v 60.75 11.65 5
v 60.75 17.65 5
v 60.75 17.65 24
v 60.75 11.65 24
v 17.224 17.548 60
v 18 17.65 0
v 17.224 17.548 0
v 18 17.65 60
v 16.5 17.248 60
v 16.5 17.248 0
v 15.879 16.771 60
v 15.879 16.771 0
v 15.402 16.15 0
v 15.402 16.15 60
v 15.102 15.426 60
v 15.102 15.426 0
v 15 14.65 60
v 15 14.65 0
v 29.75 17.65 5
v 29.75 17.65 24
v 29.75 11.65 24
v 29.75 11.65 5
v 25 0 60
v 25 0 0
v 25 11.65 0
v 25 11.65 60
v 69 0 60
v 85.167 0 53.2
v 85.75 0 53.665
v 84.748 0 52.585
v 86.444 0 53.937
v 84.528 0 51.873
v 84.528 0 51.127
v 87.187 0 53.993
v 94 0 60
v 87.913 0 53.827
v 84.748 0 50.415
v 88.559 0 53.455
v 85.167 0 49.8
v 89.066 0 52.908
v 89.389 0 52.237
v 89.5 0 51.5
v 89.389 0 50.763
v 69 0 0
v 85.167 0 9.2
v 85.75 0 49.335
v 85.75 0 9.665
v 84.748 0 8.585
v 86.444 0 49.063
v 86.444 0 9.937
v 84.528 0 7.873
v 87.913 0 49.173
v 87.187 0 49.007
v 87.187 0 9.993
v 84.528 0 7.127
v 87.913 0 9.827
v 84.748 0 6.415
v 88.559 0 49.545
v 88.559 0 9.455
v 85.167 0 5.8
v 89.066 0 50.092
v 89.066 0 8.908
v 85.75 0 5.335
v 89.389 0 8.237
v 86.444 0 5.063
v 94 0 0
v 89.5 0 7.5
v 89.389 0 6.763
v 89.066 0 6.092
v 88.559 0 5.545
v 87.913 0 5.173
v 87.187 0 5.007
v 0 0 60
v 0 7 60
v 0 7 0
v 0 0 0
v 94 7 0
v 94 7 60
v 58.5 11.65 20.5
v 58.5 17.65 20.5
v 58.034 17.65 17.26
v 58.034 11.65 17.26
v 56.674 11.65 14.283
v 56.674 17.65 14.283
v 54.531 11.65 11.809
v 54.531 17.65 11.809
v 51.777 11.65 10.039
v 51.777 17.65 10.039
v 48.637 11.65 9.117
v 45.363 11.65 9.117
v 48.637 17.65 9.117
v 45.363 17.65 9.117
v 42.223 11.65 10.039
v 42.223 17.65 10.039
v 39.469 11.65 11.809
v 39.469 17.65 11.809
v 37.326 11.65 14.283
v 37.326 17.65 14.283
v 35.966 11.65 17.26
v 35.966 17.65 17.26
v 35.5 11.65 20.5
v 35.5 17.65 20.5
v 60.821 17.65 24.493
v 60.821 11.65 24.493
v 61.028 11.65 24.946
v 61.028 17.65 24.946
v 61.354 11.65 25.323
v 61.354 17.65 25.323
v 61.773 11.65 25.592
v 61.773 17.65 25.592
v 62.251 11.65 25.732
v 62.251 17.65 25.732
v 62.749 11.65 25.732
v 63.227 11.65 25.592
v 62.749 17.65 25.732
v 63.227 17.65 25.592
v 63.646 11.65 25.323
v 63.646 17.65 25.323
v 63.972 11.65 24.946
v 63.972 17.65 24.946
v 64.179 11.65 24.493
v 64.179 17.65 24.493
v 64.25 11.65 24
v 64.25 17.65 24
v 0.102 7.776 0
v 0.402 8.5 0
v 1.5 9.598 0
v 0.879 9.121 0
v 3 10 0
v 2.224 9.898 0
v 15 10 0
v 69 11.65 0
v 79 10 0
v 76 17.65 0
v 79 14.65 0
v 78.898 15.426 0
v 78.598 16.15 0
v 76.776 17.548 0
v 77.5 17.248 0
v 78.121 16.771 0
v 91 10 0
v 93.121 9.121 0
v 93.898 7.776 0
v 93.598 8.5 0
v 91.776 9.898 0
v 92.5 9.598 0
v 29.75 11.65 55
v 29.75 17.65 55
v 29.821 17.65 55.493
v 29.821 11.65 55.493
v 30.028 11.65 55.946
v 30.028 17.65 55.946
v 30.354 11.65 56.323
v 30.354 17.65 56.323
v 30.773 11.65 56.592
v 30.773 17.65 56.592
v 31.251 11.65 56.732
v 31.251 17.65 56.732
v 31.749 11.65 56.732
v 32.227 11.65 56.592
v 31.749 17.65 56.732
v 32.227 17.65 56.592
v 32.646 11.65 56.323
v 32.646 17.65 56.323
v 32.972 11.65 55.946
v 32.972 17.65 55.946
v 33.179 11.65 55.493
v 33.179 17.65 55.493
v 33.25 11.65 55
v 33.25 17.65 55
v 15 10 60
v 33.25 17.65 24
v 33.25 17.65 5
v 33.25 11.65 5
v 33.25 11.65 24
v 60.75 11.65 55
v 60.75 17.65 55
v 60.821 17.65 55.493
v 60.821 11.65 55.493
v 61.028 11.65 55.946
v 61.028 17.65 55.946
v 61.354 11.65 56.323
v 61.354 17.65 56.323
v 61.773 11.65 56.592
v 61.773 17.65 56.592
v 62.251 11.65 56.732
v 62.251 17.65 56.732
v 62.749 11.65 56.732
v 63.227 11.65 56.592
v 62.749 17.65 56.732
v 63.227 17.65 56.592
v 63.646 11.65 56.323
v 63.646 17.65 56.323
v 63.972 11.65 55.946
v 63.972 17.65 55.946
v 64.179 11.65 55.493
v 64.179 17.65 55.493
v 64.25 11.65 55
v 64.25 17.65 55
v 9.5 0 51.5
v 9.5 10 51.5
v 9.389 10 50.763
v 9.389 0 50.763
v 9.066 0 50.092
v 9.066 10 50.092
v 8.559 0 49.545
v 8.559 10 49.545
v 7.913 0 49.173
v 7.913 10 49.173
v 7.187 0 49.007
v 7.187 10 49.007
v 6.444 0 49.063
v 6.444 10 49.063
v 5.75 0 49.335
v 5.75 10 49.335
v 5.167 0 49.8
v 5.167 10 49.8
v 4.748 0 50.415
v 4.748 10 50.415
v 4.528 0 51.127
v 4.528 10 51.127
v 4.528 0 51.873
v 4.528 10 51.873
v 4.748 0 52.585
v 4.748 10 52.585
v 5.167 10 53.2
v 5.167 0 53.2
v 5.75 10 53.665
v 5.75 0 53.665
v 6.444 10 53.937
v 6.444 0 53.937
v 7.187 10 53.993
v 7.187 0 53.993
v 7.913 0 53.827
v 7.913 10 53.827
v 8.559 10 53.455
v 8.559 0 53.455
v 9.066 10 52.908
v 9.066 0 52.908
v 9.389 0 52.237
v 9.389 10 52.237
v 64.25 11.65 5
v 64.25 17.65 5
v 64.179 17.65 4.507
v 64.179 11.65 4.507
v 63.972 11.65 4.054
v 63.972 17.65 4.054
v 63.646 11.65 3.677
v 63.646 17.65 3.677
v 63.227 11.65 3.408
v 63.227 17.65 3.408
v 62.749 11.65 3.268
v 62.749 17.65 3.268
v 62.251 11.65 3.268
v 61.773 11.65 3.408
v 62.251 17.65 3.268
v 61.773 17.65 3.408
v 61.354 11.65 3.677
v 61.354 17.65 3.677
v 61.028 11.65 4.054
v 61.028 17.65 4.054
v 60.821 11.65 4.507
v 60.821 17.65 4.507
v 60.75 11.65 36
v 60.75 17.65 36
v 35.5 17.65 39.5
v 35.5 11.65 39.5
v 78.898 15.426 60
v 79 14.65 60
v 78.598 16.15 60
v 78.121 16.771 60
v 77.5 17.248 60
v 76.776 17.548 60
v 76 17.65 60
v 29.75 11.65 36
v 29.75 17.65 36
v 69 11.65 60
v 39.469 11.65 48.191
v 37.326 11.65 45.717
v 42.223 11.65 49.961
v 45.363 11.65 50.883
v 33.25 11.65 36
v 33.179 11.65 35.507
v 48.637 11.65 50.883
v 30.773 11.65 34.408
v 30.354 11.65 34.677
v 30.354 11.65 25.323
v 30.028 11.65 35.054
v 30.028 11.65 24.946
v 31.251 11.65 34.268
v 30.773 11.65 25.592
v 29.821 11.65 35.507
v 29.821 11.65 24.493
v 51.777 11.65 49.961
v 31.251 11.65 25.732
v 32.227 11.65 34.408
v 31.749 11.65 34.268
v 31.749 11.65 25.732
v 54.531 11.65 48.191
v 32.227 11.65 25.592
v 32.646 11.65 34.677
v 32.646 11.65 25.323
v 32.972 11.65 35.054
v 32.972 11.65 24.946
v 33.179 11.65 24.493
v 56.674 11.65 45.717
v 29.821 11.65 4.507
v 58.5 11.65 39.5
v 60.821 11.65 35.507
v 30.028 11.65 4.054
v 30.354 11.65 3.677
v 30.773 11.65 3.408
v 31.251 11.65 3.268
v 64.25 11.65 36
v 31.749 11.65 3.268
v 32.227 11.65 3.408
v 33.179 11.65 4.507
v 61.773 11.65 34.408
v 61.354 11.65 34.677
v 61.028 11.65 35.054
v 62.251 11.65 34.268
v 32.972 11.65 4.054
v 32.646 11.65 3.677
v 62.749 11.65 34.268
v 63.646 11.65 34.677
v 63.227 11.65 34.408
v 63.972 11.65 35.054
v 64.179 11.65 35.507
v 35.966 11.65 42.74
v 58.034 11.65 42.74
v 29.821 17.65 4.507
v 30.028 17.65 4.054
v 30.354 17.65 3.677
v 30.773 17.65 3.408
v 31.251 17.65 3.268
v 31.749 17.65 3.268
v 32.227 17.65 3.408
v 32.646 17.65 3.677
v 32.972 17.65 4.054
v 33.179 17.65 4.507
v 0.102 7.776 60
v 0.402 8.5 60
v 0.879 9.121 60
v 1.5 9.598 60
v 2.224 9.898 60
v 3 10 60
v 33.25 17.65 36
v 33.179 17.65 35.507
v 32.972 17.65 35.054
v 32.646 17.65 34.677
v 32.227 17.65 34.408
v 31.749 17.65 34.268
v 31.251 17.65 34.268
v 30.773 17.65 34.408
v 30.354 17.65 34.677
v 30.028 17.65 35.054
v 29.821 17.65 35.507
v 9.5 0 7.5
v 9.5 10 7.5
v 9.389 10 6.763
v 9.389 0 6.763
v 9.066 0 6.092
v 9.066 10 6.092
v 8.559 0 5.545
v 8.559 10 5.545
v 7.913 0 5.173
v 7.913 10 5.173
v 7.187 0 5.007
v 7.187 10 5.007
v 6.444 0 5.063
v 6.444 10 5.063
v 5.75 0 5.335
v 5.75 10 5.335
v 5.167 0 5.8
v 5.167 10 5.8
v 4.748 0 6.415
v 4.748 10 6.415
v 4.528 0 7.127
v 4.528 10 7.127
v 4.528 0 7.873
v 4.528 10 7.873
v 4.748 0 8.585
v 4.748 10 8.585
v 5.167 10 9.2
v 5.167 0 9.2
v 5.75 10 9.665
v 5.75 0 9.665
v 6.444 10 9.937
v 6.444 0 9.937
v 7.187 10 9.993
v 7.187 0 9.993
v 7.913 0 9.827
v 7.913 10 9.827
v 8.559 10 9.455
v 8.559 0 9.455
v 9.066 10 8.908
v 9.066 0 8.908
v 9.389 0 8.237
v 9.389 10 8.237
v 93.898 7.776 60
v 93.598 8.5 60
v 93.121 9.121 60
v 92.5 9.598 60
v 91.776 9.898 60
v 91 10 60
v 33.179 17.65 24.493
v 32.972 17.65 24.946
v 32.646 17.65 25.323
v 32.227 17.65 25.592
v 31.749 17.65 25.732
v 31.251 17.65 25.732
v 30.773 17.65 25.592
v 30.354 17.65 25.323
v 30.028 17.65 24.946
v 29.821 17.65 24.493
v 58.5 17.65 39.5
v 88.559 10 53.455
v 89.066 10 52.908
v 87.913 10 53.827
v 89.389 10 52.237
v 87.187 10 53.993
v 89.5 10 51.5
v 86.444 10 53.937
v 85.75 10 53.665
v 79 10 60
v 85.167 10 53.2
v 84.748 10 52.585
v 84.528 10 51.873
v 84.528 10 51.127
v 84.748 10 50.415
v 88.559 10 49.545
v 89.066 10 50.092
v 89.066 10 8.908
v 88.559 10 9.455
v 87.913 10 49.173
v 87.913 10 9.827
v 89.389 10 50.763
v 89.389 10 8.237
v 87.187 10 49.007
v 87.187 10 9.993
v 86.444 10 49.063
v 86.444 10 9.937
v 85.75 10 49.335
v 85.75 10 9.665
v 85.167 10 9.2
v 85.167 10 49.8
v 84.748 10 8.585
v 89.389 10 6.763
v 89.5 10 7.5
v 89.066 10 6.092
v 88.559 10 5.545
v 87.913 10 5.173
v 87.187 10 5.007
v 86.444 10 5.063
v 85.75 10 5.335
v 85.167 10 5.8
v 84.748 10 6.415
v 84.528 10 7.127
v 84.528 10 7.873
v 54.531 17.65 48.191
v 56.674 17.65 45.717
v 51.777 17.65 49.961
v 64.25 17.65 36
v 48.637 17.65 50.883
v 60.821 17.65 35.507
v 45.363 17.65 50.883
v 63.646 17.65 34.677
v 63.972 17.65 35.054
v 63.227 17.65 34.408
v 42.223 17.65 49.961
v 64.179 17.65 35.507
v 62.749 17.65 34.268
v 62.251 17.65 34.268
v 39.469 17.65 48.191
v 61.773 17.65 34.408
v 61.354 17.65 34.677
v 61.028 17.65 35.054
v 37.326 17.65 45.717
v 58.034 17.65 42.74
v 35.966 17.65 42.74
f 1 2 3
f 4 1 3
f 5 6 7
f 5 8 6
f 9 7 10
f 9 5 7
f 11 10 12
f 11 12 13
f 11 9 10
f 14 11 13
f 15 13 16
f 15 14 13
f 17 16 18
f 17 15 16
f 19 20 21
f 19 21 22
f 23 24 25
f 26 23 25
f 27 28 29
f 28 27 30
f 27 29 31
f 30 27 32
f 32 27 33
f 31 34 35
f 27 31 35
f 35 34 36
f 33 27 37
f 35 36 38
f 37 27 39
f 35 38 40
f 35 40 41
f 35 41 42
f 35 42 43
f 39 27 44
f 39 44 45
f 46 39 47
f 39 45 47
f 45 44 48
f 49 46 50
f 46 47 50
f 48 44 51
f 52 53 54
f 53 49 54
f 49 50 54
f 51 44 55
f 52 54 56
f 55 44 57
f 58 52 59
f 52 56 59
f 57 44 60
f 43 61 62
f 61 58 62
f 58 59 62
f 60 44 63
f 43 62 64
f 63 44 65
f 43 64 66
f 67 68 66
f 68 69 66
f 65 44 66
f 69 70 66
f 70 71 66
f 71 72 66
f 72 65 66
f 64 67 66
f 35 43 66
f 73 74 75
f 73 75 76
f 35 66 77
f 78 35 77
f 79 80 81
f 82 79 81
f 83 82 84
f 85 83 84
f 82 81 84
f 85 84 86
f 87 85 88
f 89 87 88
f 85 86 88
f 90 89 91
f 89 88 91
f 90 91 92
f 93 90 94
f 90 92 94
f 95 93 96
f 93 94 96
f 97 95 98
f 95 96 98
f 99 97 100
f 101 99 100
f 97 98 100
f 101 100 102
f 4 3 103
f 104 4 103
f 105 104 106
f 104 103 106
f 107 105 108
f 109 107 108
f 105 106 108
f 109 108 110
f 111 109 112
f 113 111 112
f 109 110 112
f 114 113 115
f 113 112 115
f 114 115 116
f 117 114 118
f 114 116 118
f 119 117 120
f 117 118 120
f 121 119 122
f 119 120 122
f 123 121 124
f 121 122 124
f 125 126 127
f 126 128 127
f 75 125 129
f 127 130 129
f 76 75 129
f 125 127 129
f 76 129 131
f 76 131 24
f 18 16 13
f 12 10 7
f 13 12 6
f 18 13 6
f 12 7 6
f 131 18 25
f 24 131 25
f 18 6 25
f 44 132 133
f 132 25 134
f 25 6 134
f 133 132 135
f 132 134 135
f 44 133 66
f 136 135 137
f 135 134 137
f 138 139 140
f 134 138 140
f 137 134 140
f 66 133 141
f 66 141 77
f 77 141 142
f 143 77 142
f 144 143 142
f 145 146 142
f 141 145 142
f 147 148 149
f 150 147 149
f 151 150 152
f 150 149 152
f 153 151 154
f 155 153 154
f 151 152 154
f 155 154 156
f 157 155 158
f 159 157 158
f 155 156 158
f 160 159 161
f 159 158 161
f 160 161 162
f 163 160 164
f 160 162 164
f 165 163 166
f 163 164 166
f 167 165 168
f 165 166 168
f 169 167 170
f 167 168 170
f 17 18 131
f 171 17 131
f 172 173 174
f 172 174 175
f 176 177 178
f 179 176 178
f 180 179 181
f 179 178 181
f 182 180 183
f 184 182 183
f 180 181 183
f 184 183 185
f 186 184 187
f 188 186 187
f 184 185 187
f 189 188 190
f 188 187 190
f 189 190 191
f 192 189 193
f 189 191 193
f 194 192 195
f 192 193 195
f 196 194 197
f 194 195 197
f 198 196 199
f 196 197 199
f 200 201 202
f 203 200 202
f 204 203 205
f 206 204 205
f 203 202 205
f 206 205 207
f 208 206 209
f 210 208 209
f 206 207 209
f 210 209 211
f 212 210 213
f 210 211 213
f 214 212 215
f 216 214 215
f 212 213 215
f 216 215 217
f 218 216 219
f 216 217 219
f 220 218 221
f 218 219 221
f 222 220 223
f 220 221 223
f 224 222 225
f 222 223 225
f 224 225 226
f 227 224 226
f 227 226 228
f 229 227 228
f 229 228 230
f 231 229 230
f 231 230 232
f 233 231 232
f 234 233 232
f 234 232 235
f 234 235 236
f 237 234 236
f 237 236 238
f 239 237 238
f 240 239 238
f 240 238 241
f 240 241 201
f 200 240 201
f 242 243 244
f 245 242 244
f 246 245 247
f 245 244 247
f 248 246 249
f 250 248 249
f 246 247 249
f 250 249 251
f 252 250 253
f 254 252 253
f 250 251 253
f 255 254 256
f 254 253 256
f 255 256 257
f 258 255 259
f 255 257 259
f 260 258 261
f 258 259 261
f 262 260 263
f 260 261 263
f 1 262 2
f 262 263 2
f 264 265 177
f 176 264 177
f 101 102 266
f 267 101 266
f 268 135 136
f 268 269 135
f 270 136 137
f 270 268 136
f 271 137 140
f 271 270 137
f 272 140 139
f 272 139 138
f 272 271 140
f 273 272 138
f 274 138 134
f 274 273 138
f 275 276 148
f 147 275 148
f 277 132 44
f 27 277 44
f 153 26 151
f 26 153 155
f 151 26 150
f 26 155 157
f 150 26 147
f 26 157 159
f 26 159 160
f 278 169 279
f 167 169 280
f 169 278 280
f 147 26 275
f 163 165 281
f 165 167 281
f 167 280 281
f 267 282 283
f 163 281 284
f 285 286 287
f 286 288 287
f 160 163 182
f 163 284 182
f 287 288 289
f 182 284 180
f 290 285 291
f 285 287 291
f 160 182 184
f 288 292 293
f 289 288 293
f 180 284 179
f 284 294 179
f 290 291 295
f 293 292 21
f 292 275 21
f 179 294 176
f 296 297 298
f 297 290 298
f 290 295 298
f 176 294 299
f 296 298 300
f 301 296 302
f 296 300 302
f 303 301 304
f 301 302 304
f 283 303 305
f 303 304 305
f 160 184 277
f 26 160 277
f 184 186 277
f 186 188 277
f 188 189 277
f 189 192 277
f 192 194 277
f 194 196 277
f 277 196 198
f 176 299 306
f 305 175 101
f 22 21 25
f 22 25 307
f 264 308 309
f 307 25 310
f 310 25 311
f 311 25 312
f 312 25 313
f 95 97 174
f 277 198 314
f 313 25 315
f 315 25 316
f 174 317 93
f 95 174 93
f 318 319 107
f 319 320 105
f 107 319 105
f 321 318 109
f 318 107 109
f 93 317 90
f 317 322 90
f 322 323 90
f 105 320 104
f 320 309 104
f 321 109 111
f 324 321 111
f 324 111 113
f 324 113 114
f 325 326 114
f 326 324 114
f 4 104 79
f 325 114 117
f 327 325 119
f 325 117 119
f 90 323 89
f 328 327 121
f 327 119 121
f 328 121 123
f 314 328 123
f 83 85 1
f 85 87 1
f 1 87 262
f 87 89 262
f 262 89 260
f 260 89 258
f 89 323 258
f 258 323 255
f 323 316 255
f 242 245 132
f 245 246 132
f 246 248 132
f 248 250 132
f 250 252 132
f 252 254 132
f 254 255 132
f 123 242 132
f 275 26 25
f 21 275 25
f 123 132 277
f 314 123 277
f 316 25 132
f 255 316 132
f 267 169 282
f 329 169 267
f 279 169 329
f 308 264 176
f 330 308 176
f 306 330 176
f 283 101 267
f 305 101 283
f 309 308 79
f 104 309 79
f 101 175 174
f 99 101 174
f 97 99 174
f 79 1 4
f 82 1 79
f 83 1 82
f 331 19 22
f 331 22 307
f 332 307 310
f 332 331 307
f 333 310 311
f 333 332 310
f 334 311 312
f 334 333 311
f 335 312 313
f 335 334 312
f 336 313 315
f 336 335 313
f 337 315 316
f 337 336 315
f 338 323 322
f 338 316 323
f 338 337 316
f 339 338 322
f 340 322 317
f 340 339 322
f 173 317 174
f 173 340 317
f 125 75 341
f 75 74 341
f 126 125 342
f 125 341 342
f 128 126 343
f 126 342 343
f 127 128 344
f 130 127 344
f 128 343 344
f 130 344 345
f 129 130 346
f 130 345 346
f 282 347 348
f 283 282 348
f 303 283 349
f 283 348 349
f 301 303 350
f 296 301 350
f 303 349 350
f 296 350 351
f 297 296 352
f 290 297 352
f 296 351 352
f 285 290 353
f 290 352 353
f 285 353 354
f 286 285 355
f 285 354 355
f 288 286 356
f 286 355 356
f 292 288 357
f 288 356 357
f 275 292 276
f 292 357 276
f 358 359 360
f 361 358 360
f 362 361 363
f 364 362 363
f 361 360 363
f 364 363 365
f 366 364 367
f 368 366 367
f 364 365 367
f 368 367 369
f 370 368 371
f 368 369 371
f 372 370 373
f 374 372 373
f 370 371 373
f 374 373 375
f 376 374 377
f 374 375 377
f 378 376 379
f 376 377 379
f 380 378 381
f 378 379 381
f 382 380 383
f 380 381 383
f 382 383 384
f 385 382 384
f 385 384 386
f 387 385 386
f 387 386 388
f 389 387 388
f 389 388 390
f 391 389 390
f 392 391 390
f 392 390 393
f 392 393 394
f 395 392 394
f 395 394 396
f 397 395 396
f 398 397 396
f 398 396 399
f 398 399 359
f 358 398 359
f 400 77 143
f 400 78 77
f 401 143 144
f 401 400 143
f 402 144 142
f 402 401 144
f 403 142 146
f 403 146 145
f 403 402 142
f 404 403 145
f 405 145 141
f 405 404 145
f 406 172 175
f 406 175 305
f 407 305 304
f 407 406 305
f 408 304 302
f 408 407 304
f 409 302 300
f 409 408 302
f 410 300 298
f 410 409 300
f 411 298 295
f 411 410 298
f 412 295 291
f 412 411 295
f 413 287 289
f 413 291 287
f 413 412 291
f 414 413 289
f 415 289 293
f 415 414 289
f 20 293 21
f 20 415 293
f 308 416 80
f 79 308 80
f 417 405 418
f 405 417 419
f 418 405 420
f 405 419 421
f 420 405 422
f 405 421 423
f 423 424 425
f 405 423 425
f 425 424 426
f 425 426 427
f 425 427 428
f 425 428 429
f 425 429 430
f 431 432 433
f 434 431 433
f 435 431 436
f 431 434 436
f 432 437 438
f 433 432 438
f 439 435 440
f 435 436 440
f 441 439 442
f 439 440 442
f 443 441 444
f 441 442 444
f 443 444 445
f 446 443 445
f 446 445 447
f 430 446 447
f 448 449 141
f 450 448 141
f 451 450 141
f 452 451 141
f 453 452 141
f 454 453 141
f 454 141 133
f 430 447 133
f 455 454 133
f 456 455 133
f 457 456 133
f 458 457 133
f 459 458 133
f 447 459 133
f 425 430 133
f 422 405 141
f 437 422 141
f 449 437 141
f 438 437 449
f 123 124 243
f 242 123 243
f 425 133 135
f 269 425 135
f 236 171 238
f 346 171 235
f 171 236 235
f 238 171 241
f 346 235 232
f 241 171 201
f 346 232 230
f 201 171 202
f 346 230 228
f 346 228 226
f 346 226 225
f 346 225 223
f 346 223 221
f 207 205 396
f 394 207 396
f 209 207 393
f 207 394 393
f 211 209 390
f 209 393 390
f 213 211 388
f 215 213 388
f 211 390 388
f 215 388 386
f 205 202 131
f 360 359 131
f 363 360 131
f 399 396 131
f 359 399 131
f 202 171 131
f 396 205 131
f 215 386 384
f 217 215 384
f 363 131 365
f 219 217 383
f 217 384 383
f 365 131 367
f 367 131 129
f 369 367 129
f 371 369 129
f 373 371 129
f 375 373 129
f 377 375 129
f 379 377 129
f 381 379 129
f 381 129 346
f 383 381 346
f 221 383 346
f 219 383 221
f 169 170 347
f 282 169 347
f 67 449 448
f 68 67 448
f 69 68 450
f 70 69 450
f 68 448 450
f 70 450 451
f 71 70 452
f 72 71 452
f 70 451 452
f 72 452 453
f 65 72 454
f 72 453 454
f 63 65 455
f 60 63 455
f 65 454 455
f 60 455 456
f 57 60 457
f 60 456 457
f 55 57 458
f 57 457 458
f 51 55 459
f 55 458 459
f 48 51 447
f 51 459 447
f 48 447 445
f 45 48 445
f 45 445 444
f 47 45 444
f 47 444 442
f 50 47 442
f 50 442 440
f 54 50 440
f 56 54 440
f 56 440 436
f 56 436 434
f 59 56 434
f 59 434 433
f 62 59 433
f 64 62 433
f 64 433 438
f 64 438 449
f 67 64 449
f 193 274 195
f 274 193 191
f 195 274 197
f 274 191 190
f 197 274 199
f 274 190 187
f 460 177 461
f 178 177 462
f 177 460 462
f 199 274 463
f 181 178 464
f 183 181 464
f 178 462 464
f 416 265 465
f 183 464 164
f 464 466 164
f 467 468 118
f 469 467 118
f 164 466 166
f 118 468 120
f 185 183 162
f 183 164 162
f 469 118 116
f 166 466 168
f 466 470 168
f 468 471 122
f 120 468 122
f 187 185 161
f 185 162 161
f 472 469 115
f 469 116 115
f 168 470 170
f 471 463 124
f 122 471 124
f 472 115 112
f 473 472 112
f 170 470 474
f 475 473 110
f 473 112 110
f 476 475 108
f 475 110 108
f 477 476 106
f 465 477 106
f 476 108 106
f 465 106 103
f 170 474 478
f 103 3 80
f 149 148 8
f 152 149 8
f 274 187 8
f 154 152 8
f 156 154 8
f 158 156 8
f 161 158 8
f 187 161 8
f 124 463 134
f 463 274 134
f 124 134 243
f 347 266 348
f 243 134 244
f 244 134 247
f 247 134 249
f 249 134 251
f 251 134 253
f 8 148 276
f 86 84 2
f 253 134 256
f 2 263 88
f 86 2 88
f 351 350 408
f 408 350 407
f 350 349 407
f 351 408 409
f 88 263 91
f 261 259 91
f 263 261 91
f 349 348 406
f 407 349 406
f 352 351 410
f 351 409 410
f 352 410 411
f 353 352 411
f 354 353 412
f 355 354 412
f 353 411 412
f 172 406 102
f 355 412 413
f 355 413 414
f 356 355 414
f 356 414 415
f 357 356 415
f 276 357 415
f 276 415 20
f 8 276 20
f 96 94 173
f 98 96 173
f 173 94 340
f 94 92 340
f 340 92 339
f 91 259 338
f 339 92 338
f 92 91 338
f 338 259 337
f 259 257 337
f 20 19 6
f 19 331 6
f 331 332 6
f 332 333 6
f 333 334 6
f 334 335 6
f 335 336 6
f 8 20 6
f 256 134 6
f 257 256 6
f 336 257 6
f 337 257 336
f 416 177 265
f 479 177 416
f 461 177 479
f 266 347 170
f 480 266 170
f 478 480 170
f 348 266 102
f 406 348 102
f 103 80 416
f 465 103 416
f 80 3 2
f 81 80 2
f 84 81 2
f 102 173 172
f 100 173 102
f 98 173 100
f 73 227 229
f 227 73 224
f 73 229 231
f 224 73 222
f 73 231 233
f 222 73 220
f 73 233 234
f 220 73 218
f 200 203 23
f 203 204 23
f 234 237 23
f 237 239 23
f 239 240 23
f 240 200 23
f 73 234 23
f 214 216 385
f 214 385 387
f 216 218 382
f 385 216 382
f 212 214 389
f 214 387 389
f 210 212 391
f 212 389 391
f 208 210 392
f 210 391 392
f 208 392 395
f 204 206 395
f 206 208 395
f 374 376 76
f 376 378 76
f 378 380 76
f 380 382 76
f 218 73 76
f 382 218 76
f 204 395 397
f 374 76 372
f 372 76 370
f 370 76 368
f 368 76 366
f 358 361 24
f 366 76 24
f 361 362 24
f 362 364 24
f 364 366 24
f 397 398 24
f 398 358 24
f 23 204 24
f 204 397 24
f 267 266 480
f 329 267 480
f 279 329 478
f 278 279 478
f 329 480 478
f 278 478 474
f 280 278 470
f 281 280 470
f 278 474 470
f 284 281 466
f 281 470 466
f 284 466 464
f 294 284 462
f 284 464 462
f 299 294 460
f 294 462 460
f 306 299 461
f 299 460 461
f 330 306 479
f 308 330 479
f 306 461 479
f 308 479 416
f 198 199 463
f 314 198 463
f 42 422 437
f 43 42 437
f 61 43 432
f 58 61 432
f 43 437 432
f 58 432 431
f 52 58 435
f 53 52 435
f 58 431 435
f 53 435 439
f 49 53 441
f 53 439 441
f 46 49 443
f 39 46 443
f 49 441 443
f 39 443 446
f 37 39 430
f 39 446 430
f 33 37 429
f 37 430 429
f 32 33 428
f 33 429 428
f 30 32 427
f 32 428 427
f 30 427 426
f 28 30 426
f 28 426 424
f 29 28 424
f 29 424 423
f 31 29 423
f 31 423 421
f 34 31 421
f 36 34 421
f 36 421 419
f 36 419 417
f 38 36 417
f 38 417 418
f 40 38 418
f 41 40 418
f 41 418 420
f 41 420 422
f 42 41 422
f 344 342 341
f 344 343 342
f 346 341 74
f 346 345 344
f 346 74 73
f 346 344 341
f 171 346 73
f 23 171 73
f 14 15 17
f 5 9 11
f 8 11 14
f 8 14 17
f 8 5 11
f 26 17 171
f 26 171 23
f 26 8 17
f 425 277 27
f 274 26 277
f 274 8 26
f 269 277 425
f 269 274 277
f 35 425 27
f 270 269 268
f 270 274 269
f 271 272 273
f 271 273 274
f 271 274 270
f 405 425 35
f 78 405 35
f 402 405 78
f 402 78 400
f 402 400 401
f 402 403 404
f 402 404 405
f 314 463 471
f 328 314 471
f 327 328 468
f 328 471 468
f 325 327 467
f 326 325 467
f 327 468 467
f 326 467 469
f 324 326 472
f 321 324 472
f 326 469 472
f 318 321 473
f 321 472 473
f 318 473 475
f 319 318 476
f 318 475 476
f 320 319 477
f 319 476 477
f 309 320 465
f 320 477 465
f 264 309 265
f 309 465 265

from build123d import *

# Parameters (mm, degrees)
BOSS_EXTRUDE1_DEPTH = 60
SKETCH2_R           = 2.5
CUT_EXTRUDE1_DEPTH  = 18.65
FILLET1_R           = 3


with BuildPart() as part:
    # Sketch1 → Boss-Extrude1 (new body)
    with BuildSketch(Plane.XY):
        Polygon((0, 0), (25, 0), (25, 11.65), (69, 11.65), (69, 0), (94, 0), (94, 10), (79, 10), (79, 17.65), (15, 17.65), (15, 10), (0, 10), align=None)
    extrude(amount=BOSS_EXTRUDE1_DEPTH)

    # Sketch2 → Cut-Extrude1 (cut, through all)
    with BuildSketch(Plane(origin=(0, 17.65, 0), x_dir=(1, 0, 0), z_dir=(0, 1, 0))):
        with Locations((7, -7.5)):
            Circle(SKETCH2_R)
        with Locations((7, -51.5)):
            Circle(SKETCH2_R)
        with Locations((87, -7.5)):
            Circle(SKETCH2_R)
        with Locations((87, -51.5)):
            Circle(SKETCH2_R)
        with BuildLine():
            Line((29.75, -36), (29.75, -55))
            ThreePointArc((29.75, -55), (31.5, -56.75), (33.25, -55))
            Line((33.25, -55), (33.25, -36))
            ThreePointArc((33.25, -36), (31.5, -34.25), (29.75, -36))
        make_face()
        with BuildLine():
            Line((29.75, -24), (29.75, -5))
            ThreePointArc((29.75, -5), (31.5, -3.25), (33.25, -5))
            Line((33.25, -5), (33.25, -24))
            ThreePointArc((33.25, -24), (31.5, -25.75), (29.75, -24))
        make_face()
        with BuildLine():
            Line((60.75, -5), (60.75, -24))
            ThreePointArc((60.75, -24), (62.5, -25.75), (64.25, -24))
            Line((64.25, -24), (64.25, -5))
            ThreePointArc((64.25, -5), (62.5, -3.25), (60.75, -5))
        make_face()
        with BuildLine():
            Line((60.75, -36), (60.75, -55))
            ThreePointArc((60.75, -55), (62.5, -56.75), (64.25, -55))
            Line((64.25, -55), (64.25, -36))
            ThreePointArc((64.25, -36), (62.5, -34.25), (60.75, -36))
        make_face()
        with BuildLine():
            Line((35.5, -20.5), (35.5, -39.5))
            ThreePointArc((35.5, -39.5), (47, -51), (58.5, -39.5))
            Line((58.5, -39.5), (58.5, -20.5))
            ThreePointArc((58.5, -20.5), (47, -9), (35.5, -20.5))
        make_face()
    extrude(amount=-CUT_EXTRUDE1_DEPTH, mode=Mode.SUBTRACT)

    # Fillet1
    fillet1_edges = [part.edges().sort_by_distance(p)[0] for p in [
        (0, 10, 30),
        (15, 17.65, 30),
        (79, 17.65, 30),
        (94, 10, 30),
    ]]
    fillet(fillet1_edges, radius=FILLET1_R)


solid = part.part
